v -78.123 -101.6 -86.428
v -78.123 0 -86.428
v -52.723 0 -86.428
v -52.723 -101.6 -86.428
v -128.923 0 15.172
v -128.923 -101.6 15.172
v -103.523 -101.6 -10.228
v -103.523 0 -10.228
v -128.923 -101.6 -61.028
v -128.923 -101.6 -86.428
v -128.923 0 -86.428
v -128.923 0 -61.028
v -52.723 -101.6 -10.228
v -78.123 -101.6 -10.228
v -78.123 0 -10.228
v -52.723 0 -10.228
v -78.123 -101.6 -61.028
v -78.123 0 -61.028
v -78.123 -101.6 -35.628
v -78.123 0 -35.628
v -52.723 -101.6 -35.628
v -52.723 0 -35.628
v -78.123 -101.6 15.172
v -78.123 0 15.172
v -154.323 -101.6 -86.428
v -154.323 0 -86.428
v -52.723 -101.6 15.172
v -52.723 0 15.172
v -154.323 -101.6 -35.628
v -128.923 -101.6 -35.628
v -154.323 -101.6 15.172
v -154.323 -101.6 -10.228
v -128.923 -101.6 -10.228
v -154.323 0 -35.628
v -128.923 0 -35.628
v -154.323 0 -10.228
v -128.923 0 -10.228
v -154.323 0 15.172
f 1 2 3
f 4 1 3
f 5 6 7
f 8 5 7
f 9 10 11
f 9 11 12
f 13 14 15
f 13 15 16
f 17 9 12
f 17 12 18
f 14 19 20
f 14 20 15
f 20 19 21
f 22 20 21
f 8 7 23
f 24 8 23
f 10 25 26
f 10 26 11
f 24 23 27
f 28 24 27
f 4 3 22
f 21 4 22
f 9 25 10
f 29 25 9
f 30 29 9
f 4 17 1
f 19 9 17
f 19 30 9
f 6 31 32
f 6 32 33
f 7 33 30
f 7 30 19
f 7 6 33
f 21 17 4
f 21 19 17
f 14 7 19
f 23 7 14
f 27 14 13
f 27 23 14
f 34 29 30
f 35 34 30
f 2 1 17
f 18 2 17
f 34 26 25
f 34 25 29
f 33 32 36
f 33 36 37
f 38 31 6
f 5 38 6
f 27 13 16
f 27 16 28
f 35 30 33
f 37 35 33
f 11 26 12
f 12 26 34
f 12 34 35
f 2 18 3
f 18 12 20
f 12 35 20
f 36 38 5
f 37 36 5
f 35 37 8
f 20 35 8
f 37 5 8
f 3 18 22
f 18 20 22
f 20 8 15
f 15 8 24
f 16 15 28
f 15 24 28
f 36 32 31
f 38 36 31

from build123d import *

# Parameters (mm, degrees)
F0_W     = 101.6
F0_H     = 101.6
F1_DEPTH = 101.6
F2_W     = 25.4
F2_H     = 25.4
F3_DEPTH = 101.6
F5_DEPTH = 101.6
F6_W     = 50.8
F6_H     = 25.4
F7_DEPTH = 101.6


with BuildPart() as f1:
    # F0 (on Front) → F1 (new body)
    with BuildSketch(Plane.XZ):
        with Locations((-103.523429, -35.627711)):
            Rectangle(F0_W, F0_H)
    extrude(amount=F1_DEPTH)

    # F2 (on face) → F3 (cut)
    with BuildSketch(Plane.XZ.offset(101.6)):
        with Locations((-65.423429, -22.927711)):
            Rectangle(F2_W, F2_H)
        with Locations((-141.623429, -22.927711)):
            Rectangle(F2_W, F2_H)
    extrude(amount=-F3_DEPTH, mode=Mode.SUBTRACT)

    # F4 (on face) → F5 (cut)
    with BuildSketch(Plane.XZ.offset(101.6)):
        Polygon((-128.923429, 15.172289), (-103.523429, -10.227711), (-78.123429, 15.172289), align=None)
    extrude(amount=-F5_DEPTH, mode=Mode.SUBTRACT)

    # F6 (on face) → F7 (cut)
    with BuildSketch(Plane.XZ.offset(101.6)):
        with Locations((-103.523429, -73.727711)):
            Rectangle(F6_W, F6_H)
    extrude(amount=-F7_DEPTH, mode=Mode.SUBTRACT)


solid = f1.part
